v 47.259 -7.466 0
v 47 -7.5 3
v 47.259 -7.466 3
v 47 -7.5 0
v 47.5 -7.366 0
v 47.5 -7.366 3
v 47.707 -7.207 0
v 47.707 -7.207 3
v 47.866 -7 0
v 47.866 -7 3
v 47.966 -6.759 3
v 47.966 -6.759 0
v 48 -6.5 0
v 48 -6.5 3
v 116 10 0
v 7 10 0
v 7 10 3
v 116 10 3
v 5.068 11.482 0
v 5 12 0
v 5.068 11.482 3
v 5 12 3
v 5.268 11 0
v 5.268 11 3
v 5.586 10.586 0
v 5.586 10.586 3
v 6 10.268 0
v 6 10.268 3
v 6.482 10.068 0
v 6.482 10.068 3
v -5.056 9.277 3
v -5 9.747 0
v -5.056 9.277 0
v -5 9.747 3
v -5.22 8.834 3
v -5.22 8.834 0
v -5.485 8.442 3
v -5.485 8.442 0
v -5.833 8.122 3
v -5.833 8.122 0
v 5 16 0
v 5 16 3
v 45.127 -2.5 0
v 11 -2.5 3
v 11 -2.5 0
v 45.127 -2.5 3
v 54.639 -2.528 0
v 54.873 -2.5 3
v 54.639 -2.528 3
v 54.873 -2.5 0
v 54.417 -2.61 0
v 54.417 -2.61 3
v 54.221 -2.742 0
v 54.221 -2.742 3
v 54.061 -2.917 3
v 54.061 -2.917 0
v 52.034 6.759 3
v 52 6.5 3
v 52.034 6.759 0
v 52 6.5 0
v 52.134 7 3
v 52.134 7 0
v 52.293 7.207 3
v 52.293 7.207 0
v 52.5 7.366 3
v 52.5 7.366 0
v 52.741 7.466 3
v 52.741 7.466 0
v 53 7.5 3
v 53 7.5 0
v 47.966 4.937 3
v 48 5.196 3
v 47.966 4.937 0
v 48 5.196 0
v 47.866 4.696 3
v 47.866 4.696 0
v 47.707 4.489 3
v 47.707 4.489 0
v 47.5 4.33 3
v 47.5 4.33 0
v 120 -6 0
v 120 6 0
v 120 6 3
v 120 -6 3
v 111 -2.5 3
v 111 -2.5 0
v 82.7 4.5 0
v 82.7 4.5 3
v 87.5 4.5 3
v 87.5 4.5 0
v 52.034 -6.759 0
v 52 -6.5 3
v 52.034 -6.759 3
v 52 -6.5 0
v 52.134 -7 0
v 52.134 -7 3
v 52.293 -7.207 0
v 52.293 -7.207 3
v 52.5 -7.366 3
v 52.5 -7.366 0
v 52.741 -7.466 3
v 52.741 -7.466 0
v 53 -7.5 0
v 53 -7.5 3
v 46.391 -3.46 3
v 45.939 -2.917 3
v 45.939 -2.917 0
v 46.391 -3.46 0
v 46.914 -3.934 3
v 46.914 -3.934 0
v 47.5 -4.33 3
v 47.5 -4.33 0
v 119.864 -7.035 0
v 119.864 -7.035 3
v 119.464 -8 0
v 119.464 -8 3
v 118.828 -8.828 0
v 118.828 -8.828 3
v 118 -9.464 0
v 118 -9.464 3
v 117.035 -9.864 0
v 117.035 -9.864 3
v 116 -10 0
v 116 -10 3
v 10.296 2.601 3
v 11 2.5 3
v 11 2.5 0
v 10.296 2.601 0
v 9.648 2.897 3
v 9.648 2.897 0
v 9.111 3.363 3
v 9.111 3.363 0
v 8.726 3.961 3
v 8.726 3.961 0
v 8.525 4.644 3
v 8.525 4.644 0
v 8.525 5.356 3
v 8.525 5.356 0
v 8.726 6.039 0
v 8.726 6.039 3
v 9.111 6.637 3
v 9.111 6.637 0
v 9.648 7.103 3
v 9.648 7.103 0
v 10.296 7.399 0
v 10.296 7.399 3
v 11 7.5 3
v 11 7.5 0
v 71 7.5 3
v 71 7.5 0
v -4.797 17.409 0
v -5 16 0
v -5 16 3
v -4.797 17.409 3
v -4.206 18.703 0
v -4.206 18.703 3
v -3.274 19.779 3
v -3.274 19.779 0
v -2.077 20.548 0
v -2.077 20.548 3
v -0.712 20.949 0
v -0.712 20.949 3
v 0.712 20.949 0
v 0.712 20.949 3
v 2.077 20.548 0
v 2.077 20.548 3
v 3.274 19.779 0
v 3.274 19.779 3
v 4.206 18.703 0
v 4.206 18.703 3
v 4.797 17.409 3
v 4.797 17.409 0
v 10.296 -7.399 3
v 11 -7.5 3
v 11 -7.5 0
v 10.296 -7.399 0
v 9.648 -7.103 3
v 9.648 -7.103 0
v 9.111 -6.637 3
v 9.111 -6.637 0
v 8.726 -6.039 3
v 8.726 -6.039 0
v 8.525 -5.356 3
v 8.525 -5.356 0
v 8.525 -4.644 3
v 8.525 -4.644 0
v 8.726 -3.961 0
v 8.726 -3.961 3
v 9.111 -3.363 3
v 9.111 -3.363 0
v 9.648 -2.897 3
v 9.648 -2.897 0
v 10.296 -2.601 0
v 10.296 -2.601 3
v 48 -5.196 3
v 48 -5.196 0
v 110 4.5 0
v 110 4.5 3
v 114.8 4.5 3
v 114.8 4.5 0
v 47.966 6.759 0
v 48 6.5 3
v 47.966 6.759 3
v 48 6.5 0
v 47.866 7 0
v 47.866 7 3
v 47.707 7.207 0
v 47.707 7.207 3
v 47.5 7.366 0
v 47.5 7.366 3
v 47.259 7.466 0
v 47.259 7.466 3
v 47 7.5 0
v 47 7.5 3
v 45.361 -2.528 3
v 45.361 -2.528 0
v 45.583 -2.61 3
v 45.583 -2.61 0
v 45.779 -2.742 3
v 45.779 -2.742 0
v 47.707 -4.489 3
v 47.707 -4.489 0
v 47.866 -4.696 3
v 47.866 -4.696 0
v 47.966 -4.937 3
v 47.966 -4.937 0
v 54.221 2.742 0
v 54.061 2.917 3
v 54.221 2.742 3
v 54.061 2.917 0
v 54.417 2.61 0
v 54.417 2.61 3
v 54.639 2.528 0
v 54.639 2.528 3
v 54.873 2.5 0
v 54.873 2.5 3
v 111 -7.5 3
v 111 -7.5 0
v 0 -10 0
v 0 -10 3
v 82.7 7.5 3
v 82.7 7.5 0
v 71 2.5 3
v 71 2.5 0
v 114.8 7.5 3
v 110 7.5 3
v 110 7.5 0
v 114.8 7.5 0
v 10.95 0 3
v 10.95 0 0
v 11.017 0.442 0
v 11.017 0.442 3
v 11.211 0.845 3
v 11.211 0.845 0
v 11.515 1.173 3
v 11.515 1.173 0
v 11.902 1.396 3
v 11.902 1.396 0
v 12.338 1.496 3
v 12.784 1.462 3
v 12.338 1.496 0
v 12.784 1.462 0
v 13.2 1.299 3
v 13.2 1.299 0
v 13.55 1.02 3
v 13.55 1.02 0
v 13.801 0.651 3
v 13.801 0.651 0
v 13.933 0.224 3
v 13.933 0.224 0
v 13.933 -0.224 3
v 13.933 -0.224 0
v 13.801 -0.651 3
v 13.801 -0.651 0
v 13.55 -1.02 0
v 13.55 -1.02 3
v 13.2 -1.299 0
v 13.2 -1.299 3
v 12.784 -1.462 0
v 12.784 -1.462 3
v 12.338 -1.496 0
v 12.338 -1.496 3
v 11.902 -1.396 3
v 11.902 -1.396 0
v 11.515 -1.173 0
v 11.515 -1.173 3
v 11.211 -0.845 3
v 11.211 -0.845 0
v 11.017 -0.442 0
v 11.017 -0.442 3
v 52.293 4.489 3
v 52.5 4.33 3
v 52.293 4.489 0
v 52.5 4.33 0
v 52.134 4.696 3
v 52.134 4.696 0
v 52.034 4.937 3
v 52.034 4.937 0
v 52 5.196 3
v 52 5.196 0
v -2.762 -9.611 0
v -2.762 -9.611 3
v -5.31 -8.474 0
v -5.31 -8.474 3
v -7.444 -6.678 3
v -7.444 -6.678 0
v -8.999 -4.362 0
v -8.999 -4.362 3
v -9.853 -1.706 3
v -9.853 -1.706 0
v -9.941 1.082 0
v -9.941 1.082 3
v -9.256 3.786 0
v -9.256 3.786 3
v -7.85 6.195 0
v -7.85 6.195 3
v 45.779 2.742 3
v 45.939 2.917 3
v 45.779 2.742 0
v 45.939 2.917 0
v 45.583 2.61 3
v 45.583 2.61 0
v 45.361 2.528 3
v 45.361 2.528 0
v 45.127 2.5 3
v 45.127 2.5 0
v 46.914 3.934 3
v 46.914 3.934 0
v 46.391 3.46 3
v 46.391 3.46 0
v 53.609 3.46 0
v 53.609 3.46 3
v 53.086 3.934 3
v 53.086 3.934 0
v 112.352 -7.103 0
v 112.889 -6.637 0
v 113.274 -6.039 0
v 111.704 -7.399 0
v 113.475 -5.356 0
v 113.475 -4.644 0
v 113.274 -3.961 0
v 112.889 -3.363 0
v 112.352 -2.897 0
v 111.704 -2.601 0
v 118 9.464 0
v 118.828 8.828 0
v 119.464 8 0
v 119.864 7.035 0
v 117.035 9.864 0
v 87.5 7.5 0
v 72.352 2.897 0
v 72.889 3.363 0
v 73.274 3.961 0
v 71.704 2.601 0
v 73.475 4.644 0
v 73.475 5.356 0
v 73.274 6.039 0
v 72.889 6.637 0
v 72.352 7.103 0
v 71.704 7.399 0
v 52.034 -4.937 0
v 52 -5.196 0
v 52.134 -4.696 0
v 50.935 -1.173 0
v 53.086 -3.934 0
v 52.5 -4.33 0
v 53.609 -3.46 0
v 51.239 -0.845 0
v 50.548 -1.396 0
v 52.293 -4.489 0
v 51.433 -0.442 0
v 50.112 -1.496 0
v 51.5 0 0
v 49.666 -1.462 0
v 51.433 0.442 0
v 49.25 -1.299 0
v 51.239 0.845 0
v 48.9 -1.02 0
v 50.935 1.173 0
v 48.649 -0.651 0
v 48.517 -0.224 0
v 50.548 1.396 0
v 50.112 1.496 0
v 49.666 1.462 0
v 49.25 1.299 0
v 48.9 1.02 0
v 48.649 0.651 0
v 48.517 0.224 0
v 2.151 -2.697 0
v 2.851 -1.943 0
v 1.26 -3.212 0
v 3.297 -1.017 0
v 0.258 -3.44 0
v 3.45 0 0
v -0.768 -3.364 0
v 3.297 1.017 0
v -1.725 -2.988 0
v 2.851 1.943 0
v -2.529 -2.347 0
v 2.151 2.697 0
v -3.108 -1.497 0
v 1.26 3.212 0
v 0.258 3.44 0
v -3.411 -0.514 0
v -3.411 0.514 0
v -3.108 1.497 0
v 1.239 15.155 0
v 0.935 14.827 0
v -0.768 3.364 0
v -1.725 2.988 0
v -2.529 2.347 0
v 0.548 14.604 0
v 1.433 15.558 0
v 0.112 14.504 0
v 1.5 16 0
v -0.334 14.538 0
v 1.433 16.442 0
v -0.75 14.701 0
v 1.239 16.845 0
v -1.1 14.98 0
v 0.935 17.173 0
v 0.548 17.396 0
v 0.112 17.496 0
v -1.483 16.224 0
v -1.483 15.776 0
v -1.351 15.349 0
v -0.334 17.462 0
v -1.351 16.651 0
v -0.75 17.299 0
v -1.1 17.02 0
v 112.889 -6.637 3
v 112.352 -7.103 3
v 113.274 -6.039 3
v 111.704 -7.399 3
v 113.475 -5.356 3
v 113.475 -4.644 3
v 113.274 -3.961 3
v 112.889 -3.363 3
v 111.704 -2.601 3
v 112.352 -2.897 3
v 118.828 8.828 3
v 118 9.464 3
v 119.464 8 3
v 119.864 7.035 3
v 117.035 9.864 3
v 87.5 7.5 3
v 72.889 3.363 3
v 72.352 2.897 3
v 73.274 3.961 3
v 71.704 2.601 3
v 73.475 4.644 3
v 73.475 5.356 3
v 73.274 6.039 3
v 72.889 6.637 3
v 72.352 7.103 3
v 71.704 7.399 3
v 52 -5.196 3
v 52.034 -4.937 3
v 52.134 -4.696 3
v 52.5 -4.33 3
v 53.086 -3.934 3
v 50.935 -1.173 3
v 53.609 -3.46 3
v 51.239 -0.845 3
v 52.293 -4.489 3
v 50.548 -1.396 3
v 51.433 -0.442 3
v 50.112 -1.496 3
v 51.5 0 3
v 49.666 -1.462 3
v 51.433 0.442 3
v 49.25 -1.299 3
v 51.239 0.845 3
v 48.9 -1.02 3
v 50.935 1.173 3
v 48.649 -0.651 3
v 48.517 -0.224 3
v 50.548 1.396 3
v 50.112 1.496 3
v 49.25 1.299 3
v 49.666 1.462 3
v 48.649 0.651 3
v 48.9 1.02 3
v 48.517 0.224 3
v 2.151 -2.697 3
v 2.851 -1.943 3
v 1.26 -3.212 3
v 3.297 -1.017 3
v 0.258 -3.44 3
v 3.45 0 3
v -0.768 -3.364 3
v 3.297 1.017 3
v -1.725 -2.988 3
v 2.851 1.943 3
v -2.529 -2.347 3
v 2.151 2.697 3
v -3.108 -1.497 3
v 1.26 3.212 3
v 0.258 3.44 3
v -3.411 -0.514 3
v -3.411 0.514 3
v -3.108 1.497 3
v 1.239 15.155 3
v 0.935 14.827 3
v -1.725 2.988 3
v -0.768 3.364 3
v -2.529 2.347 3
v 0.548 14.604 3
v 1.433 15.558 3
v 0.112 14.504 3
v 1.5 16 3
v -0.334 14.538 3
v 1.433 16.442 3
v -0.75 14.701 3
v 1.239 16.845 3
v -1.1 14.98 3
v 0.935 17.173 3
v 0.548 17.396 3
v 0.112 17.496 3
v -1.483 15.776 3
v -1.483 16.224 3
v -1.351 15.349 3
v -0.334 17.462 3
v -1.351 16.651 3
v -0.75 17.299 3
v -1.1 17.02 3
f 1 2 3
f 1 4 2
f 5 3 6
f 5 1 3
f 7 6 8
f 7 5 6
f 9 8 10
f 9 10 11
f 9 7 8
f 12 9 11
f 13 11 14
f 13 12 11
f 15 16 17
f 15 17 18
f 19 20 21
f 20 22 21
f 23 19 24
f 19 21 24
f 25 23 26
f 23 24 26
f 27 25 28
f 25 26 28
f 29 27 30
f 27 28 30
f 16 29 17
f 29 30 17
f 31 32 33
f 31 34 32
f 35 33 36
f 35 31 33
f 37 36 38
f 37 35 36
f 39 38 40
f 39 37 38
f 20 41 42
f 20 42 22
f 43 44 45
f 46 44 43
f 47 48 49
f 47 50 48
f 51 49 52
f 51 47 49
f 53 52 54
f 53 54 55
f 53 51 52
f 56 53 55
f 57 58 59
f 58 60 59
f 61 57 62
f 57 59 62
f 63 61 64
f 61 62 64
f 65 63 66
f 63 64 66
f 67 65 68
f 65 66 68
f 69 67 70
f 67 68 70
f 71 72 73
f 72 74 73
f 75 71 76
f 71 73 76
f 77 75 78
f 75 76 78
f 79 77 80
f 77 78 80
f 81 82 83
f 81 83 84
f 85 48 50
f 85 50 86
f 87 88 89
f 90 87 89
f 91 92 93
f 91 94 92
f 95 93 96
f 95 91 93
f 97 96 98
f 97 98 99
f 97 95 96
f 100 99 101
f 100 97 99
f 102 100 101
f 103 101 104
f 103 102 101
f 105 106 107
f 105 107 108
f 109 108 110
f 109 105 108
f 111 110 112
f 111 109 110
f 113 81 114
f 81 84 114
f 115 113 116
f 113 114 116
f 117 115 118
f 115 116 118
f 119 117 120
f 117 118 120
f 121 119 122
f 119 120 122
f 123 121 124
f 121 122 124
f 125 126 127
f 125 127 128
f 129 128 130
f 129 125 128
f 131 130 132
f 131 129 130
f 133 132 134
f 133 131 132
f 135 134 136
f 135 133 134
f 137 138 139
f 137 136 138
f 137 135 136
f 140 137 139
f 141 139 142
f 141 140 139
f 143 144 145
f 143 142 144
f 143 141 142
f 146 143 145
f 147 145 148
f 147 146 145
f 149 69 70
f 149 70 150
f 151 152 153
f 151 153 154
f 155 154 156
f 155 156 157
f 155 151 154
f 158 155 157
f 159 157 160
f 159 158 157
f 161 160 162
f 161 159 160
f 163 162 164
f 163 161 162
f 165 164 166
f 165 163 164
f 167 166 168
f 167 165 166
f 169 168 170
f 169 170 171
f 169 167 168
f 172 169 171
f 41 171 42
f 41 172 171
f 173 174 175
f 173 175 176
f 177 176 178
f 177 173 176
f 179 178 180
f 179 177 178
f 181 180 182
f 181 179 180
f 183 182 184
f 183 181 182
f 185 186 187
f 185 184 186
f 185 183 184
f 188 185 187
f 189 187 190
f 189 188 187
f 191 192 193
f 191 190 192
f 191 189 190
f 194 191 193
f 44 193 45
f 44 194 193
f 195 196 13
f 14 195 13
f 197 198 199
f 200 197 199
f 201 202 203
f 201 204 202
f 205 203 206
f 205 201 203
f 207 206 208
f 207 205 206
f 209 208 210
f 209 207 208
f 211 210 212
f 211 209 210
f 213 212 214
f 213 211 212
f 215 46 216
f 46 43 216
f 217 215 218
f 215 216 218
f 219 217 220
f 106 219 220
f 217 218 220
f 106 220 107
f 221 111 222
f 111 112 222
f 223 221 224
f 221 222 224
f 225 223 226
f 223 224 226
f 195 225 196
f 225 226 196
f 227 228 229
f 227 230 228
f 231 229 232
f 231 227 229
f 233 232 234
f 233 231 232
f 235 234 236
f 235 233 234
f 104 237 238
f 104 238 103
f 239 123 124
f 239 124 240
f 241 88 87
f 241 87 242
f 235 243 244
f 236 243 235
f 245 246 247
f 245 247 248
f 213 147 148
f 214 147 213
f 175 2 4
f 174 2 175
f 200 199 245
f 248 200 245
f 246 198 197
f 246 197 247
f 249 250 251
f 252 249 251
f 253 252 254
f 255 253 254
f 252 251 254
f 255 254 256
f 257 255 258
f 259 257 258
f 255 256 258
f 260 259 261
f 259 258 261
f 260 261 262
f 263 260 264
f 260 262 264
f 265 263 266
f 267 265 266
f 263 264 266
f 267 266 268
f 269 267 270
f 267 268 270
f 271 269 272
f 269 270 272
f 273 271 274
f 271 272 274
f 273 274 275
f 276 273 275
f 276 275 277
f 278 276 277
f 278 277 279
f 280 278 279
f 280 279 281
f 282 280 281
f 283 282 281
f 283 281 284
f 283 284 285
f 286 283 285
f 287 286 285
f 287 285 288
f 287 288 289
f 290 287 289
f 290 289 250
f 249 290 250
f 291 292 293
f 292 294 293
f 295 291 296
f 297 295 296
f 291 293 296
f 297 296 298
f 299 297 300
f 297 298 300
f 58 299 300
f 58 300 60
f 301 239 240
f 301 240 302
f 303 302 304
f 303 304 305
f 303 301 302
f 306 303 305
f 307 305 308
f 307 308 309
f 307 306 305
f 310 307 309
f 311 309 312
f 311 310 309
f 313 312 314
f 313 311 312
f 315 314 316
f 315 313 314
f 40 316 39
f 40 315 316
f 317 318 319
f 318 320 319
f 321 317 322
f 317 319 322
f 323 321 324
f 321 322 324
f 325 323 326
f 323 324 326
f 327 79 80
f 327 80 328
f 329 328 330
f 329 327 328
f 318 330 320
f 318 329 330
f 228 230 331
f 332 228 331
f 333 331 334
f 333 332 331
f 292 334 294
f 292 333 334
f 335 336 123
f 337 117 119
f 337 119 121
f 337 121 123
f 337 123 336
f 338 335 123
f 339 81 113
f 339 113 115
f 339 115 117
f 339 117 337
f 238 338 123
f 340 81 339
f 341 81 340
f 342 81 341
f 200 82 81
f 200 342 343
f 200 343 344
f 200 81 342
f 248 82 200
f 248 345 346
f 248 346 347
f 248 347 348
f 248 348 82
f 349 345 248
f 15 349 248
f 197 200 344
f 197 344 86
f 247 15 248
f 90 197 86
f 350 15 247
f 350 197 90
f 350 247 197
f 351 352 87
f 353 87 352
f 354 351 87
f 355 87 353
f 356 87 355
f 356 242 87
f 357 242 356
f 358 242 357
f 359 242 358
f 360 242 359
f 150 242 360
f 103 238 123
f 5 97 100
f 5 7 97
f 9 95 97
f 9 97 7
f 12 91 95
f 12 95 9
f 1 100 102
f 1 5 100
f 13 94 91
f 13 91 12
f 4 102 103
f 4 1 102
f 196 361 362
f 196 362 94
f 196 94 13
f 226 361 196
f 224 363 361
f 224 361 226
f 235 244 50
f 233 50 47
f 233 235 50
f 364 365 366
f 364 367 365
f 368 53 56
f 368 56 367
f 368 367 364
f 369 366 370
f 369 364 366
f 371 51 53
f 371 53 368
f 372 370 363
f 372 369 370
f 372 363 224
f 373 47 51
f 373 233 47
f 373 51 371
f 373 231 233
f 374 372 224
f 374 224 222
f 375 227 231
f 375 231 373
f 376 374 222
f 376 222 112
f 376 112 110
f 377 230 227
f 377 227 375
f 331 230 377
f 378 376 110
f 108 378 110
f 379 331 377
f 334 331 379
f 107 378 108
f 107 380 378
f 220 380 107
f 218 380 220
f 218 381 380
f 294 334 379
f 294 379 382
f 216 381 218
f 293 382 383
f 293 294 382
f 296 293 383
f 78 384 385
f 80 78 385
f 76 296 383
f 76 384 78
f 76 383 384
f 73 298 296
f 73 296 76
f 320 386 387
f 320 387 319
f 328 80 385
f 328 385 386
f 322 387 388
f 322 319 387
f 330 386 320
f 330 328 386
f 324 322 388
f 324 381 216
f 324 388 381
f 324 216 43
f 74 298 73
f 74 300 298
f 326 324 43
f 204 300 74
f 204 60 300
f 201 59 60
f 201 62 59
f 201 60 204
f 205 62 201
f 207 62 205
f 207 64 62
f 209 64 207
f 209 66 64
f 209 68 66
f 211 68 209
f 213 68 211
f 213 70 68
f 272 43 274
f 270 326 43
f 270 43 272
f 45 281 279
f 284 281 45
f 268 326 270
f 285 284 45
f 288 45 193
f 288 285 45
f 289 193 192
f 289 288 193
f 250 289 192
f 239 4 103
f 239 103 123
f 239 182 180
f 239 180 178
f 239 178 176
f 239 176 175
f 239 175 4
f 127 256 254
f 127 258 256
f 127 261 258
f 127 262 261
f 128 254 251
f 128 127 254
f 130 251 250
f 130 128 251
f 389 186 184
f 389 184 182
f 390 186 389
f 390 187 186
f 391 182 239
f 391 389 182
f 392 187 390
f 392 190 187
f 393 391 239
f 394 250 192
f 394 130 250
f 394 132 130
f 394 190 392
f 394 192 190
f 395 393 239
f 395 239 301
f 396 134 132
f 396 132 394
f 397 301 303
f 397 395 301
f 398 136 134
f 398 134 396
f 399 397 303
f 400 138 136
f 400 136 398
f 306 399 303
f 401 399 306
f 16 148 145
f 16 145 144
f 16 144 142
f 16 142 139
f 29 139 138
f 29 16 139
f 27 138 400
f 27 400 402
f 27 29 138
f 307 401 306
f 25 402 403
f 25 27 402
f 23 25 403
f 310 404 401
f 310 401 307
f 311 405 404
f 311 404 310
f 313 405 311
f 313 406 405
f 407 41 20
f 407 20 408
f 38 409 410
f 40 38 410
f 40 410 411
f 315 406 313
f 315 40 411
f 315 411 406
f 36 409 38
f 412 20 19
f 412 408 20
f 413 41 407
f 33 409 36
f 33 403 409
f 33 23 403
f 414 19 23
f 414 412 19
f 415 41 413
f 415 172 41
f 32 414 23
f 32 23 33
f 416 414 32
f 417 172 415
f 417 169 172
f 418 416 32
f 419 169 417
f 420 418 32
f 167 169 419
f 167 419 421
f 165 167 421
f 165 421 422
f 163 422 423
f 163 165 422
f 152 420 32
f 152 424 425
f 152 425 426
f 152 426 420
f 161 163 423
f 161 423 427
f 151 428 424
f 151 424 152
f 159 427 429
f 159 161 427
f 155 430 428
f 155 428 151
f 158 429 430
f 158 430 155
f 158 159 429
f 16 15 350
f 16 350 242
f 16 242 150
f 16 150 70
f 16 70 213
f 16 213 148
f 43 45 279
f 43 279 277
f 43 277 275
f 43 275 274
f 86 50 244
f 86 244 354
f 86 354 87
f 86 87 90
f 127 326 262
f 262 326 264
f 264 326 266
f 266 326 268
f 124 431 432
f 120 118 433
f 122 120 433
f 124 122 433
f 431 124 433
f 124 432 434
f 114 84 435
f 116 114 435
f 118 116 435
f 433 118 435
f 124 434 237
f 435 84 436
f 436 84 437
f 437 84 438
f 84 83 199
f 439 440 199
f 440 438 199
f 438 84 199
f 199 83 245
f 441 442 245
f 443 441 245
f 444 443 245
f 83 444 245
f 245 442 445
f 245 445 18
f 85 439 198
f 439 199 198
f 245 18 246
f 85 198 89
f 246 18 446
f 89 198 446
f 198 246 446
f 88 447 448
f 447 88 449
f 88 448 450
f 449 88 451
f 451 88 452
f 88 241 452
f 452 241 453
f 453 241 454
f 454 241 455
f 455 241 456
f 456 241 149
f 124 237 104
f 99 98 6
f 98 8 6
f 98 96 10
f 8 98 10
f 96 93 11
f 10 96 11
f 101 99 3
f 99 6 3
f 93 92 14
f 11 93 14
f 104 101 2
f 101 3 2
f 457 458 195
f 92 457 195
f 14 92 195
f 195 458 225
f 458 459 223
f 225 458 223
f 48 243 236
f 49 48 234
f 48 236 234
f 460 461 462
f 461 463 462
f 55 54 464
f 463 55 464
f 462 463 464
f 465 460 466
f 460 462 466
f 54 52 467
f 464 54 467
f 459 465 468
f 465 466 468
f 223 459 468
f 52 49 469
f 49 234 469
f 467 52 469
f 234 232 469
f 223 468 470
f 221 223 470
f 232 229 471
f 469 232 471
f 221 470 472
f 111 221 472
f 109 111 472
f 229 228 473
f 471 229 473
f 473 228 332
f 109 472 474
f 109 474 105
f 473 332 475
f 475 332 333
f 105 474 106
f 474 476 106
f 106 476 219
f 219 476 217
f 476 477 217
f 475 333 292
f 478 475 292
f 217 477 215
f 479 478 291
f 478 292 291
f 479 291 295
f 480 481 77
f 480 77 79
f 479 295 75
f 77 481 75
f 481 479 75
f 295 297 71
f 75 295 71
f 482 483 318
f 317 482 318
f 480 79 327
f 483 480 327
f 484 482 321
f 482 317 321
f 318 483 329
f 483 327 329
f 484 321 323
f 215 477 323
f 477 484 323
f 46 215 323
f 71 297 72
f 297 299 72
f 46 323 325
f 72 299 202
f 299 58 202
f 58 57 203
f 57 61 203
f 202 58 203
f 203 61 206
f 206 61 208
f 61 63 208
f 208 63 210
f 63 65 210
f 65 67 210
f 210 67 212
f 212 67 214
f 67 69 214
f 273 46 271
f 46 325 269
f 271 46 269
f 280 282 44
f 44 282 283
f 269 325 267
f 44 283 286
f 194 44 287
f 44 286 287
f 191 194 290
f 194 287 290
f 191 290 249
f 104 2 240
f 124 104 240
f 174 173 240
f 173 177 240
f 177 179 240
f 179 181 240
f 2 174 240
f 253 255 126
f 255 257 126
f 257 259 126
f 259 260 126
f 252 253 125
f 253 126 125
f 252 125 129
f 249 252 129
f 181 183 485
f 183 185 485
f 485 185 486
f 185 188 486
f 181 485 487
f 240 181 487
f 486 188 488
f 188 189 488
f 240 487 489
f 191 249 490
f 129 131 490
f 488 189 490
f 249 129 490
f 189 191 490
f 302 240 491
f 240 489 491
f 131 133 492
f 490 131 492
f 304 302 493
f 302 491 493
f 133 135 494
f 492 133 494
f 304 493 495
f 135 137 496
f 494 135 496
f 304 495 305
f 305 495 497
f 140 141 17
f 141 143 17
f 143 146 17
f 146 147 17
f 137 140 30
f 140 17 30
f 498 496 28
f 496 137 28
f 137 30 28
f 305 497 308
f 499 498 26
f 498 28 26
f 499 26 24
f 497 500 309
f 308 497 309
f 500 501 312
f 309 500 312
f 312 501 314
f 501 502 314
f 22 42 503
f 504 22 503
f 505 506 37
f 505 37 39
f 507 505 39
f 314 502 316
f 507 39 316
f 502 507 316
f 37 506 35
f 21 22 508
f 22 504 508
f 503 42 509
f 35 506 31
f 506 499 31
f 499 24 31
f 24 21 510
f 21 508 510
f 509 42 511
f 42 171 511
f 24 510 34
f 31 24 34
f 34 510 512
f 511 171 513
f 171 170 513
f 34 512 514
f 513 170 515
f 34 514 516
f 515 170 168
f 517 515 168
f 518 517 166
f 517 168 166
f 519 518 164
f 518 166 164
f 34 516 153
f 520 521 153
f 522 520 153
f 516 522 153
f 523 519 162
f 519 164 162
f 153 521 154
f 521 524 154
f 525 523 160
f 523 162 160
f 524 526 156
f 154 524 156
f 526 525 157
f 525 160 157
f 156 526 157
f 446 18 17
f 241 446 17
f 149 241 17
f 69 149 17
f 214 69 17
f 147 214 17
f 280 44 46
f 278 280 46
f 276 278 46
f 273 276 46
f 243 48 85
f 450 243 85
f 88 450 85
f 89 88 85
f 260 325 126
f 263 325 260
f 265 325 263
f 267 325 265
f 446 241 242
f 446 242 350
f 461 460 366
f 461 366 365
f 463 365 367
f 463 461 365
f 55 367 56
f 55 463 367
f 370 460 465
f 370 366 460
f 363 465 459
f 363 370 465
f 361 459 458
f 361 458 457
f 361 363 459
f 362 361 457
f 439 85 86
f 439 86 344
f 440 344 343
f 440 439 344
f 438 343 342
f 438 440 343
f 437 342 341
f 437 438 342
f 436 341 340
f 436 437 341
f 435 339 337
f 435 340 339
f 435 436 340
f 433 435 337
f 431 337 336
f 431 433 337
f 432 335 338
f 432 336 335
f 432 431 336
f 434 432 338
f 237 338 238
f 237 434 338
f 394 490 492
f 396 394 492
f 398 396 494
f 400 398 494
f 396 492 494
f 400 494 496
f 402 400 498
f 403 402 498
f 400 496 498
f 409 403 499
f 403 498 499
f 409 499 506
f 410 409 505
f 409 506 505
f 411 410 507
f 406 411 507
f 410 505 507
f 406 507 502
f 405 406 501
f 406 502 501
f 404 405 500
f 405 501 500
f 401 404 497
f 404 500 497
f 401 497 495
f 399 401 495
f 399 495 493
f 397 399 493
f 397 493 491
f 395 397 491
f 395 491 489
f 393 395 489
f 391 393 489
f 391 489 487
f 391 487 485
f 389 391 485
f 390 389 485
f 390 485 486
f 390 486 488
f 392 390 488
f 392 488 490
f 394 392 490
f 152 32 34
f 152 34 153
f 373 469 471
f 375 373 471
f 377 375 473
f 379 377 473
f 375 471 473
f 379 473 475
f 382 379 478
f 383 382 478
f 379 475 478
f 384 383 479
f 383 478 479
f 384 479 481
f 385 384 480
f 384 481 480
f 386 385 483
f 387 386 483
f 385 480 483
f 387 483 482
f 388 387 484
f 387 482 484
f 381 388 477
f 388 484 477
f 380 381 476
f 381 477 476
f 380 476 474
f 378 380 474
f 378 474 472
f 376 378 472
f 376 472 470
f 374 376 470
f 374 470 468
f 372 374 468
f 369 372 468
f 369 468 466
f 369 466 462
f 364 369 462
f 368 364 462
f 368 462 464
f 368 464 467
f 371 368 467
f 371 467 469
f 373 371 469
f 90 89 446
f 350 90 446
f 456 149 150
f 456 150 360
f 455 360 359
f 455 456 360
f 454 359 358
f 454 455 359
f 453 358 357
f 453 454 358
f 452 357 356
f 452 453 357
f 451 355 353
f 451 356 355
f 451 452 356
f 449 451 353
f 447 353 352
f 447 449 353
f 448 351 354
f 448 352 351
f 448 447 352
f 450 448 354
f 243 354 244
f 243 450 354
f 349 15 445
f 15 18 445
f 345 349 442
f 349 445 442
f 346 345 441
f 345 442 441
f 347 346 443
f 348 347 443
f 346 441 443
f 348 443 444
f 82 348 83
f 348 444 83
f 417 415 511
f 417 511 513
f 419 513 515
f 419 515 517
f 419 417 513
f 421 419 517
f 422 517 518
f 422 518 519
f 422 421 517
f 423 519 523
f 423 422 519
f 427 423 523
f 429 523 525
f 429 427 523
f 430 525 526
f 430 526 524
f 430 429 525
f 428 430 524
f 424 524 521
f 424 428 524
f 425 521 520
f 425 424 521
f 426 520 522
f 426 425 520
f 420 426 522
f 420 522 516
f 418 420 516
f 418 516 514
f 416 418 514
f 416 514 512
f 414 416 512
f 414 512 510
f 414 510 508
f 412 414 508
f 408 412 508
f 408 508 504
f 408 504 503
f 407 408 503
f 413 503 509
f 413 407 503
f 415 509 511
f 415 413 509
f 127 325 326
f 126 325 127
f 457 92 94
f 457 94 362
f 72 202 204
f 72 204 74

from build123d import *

# Parameters (mm, degrees)
BOSS_EXTRUDE1_DEPTH = 3
CUT_EXTRUDE1_REACH  = 122.453
SKETCH2_R           = 3.45
FILLET1_R           = 4
CUT_EXTRUDE2_REACH  = 122.453
SKETCH3_W           = 4.8
SKETCH3_H           = 3
CUT_EXTRUDE3_REACH  = 122.453
SKETCH5_R           = 1.5
BOSS_EXTRUDE2_DEPTH = 3
CUT_EXTRUDE4_REACH  = 122.453
SKETCH5_3_R         = 1.5
FILLET2_R           = 1
CUT_EXTRUDE5_REACH  = 122.453
SKETCH6_R           = 1.5
BOSS_EXTRUDE3_START = -3
SKETCH8_R           = 1.5
BOSS_EXTRUDE3_DEPTH = 3
FILLET3_R           = 2


with BuildPart() as part:
    # Sketch1 → Boss-Extrude1 (new body)
    with BuildSketch(Plane.XY):
        with BuildLine():
            Line((0, 10), (120, 10))
            Line((120, 10), (120, -10))
            Line((120, -10), (0, -10))
            ThreePointArc((0, -10), (-10, 0), (0, 10))
        make_face()
    extrude(amount=BOSS_EXTRUDE1_DEPTH)

    # Sketch2 → Cut-Extrude1 (cut, up to next)
    with BuildSketch(Plane.XY.offset(3), mode=Mode.PRIVATE) as cut_extrude1_sk1:
        Circle(SKETCH2_R)
    cut_extrude1_tool1 = extrude(cut_extrude1_sk1.sketch, amount=-CUT_EXTRUDE1_REACH, mode=Mode.PRIVATE) & part.part
    add(cut_extrude1_tool1.solids().sort_by_distance((0, 0, 3))[0], mode=Mode.SUBTRACT)

    # Fillet1
    fillet1_edges = [part.edges().sort_by_distance(p)[0] for p in [
        (120, 10, 1.5),
        (120, -10, 1.5),
    ]]
    fillet(fillet1_edges, radius=FILLET1_R)

    # Sketch3 → Cut-Extrude2 (cut, up to next)
    with BuildSketch(Plane.XY.offset(3), mode=Mode.PRIVATE) as cut_extrude2_sk1:
        with Locations((85.1, 6)):
            Rectangle(SKETCH3_W, SKETCH3_H)
    cut_extrude2_tool1 = extrude(cut_extrude2_sk1.sketch, amount=-CUT_EXTRUDE2_REACH, mode=Mode.PRIVATE) & part.part
    # Sketch3 → Cut-Extrude2 (cut, up to next)
    with BuildSketch(Plane.XY.offset(3), mode=Mode.PRIVATE) as cut_extrude2_sk2:
        with Locations((112.4, 6)):
            Rectangle(SKETCH3_W, SKETCH3_H)
    cut_extrude2_tool2 = extrude(cut_extrude2_sk2.sketch, amount=-CUT_EXTRUDE2_REACH, mode=Mode.PRIVATE) & part.part
    add(cut_extrude2_tool1.solids().sort_by_distance((85.1, 6, 3))[0], mode=Mode.SUBTRACT)
    add(cut_extrude2_tool2.solids().sort_by_distance((112.4, 6, 3))[0], mode=Mode.SUBTRACT)

    # Sketch4 → Cut-Extrude3 (cut, up to next)
    with BuildSketch(Plane.XY.offset(3), mode=Mode.PRIVATE) as cut_extrude3_sk1:
        with BuildLine():
            Line((11, 7.5), (71, 7.5))
            ThreePointArc((71, 7.5), (73.5, 5), (71, 2.5))
            Line((71, 2.5), (11, 2.5))
            ThreePointArc((11, 2.5), (8.5, 5), (11, 7.5))
        make_face()
    cut_extrude3_tool1 = extrude(cut_extrude3_sk1.sketch, amount=-CUT_EXTRUDE3_REACH, mode=Mode.PRIVATE) & part.part
    # Sketch4 → Cut-Extrude3 (cut, up to next)
    with BuildSketch(Plane.XY.offset(3), mode=Mode.PRIVATE) as cut_extrude3_sk2:
        with BuildLine():
            Line((11, -2.5), (111, -2.5))
            ThreePointArc((111, -2.5), (113.5, -5), (111, -7.5))
            Line((111, -7.5), (11, -7.5))
            ThreePointArc((11, -7.5), (8.5, -5), (11, -2.5))
        make_face()
    cut_extrude3_tool2 = extrude(cut_extrude3_sk2.sketch, amount=-CUT_EXTRUDE3_REACH, mode=Mode.PRIVATE) & part.part
    add(cut_extrude3_tool1.solids().sort_by_distance((41, 5, 3))[0], mode=Mode.SUBTRACT)
    add(cut_extrude3_tool2.solids().sort_by_distance((61, -5, 3))[0], mode=Mode.SUBTRACT)

    # Sketch5 → Boss-Extrude2 (add)
    # profile 1 of 3: a face of its own
    with BuildSketch(Plane.XY.offset(3)):
        with BuildLine():
            Line((52, 7.5), (48, 7.5))
            Line((48, 7.5), (48, 4.582575695))
            ThreePointArc((48, 4.582575695), (46.668047509, 3.728014565), (45.669872981, 2.5))
            Line((45.669872981, 2.5), (54.330127019, 2.5))
            ThreePointArc((54.330127019, 2.5), (53.331952491, 3.728014565), (52, 4.582575695))
            Line((52, 4.582575695), (52, 7.5))
        make_face()
    # profile 2 of 3: a face of its own
    with BuildSketch(Plane.XY.offset(3)):
        with BuildLine():
            Line((54.330127019, -2.5), (45.669872981, -2.5))
            ThreePointArc((45.669872981, -2.5), (46.668047509, -3.728014565), (48, -4.582575695))
            Line((48, -4.582575695), (48, -7.5))
            Line((48, -7.5), (52, -7.5))
            Line((52, -7.5), (52, -4.582575695))
            ThreePointArc((52, -4.582575695), (53.331952491, -3.728014565), (54.330127019, -2.5))
        make_face()
    # profile 3 of 3: a face of its own
    with BuildSketch(Plane.XY.offset(3)):
        with BuildLine():
            Line((54.330127019, 2.5), (45.669872981, 2.5))
            ThreePointArc((45.669872981, 2.5), (45, 0), (45.669872981, -2.5))
            Line((45.669872981, -2.5), (54.330127019, -2.5))
            ThreePointArc((54.330127019, -2.5), (55, 0), (54.330127019, 2.5))
        make_face()
        with Locations((50, 0)):
            Circle(SKETCH5_R, mode=Mode.SUBTRACT)
    extrude(amount=-BOSS_EXTRUDE2_DEPTH)

    # Sketch5<3> → Cut-Extrude4 (cut, up to next)
    with BuildSketch(Plane.XY.offset(3), mode=Mode.PRIVATE) as cut_extrude4_sk1:
        with Locations((50, 0)):
            Circle(SKETCH5_3_R)
    cut_extrude4_tool1 = extrude(cut_extrude4_sk1.sketch, amount=-CUT_EXTRUDE4_REACH, mode=Mode.PRIVATE) & part.part
    add(cut_extrude4_tool1.solids().sort_by_distance((50, 0, 3))[0], mode=Mode.SUBTRACT)

    # Fillet2
    fillet2_edges = [part.edges().sort_by_distance(p)[0] for p in [
        (52, 4.582575695, 1.5),
        (48, -4.582575695, 1.5),
        (48, -7.5, 1.5),
        (52, -7.5, 1.5),
        (52, -4.582575695, 1.5),
        (54.330127019, -2.5, 1.5),
        (52, 7.5, 1.5),
        (48, 7.5, 1.5),
        (48, 4.582575695, 1.5),
        (45.669872981, -2.5, 1.5),
        (45.669872981, 2.5, 1.5),
        (54.330127019, 2.5, 1.5),
    ]]
    fillet(fillet2_edges, radius=FILLET2_R)

    # Sketch6 → Cut-Extrude5 (cut, up to next)
    with BuildSketch(Plane(origin=(0, 0, 0), x_dir=(-1, 0, 0), z_dir=(0, 0, -1)), mode=Mode.PRIVATE) as cut_extrude5_sk1:
        with Locations((-12.45, 0)):
            Circle(SKETCH6_R)
    cut_extrude5_tool1 = extrude(cut_extrude5_sk1.sketch, amount=-CUT_EXTRUDE5_REACH, mode=Mode.PRIVATE) & part.part
    add(cut_extrude5_tool1.solids().sort_by_distance((12.45, 0, 0))[0], mode=Mode.SUBTRACT)

    # Sketch8 → Boss-Extrude3 (add)
    with BuildSketch(Plane.XY.offset(3).offset(BOSS_EXTRUDE3_START)):
        with BuildLine():
            Line((5, 16), (5, 10))
            Line((5, 10), (0, 10))
            ThreePointArc((0, 10), (-2.588190451, 9.659258263), (-5, 8.660254038))
            Line((-5, 8.660254038), (-5, 16))
            ThreePointArc((-5, 16), (0, 21), (5, 16))
        make_face()
        with Locations((0, 16)):
            Circle(SKETCH8_R, mode=Mode.SUBTRACT)
    extrude(amount=BOSS_EXTRUDE3_DEPTH)

    # Fillet3
    fillet3_edges = [part.edges().sort_by_distance(p)[0] for p in [
        (5, 10, 1.5),
        (-5, 8.660254038, 1.5),
    ]]
    fillet(fillet3_edges, radius=FILLET3_R)


solid = part.part
